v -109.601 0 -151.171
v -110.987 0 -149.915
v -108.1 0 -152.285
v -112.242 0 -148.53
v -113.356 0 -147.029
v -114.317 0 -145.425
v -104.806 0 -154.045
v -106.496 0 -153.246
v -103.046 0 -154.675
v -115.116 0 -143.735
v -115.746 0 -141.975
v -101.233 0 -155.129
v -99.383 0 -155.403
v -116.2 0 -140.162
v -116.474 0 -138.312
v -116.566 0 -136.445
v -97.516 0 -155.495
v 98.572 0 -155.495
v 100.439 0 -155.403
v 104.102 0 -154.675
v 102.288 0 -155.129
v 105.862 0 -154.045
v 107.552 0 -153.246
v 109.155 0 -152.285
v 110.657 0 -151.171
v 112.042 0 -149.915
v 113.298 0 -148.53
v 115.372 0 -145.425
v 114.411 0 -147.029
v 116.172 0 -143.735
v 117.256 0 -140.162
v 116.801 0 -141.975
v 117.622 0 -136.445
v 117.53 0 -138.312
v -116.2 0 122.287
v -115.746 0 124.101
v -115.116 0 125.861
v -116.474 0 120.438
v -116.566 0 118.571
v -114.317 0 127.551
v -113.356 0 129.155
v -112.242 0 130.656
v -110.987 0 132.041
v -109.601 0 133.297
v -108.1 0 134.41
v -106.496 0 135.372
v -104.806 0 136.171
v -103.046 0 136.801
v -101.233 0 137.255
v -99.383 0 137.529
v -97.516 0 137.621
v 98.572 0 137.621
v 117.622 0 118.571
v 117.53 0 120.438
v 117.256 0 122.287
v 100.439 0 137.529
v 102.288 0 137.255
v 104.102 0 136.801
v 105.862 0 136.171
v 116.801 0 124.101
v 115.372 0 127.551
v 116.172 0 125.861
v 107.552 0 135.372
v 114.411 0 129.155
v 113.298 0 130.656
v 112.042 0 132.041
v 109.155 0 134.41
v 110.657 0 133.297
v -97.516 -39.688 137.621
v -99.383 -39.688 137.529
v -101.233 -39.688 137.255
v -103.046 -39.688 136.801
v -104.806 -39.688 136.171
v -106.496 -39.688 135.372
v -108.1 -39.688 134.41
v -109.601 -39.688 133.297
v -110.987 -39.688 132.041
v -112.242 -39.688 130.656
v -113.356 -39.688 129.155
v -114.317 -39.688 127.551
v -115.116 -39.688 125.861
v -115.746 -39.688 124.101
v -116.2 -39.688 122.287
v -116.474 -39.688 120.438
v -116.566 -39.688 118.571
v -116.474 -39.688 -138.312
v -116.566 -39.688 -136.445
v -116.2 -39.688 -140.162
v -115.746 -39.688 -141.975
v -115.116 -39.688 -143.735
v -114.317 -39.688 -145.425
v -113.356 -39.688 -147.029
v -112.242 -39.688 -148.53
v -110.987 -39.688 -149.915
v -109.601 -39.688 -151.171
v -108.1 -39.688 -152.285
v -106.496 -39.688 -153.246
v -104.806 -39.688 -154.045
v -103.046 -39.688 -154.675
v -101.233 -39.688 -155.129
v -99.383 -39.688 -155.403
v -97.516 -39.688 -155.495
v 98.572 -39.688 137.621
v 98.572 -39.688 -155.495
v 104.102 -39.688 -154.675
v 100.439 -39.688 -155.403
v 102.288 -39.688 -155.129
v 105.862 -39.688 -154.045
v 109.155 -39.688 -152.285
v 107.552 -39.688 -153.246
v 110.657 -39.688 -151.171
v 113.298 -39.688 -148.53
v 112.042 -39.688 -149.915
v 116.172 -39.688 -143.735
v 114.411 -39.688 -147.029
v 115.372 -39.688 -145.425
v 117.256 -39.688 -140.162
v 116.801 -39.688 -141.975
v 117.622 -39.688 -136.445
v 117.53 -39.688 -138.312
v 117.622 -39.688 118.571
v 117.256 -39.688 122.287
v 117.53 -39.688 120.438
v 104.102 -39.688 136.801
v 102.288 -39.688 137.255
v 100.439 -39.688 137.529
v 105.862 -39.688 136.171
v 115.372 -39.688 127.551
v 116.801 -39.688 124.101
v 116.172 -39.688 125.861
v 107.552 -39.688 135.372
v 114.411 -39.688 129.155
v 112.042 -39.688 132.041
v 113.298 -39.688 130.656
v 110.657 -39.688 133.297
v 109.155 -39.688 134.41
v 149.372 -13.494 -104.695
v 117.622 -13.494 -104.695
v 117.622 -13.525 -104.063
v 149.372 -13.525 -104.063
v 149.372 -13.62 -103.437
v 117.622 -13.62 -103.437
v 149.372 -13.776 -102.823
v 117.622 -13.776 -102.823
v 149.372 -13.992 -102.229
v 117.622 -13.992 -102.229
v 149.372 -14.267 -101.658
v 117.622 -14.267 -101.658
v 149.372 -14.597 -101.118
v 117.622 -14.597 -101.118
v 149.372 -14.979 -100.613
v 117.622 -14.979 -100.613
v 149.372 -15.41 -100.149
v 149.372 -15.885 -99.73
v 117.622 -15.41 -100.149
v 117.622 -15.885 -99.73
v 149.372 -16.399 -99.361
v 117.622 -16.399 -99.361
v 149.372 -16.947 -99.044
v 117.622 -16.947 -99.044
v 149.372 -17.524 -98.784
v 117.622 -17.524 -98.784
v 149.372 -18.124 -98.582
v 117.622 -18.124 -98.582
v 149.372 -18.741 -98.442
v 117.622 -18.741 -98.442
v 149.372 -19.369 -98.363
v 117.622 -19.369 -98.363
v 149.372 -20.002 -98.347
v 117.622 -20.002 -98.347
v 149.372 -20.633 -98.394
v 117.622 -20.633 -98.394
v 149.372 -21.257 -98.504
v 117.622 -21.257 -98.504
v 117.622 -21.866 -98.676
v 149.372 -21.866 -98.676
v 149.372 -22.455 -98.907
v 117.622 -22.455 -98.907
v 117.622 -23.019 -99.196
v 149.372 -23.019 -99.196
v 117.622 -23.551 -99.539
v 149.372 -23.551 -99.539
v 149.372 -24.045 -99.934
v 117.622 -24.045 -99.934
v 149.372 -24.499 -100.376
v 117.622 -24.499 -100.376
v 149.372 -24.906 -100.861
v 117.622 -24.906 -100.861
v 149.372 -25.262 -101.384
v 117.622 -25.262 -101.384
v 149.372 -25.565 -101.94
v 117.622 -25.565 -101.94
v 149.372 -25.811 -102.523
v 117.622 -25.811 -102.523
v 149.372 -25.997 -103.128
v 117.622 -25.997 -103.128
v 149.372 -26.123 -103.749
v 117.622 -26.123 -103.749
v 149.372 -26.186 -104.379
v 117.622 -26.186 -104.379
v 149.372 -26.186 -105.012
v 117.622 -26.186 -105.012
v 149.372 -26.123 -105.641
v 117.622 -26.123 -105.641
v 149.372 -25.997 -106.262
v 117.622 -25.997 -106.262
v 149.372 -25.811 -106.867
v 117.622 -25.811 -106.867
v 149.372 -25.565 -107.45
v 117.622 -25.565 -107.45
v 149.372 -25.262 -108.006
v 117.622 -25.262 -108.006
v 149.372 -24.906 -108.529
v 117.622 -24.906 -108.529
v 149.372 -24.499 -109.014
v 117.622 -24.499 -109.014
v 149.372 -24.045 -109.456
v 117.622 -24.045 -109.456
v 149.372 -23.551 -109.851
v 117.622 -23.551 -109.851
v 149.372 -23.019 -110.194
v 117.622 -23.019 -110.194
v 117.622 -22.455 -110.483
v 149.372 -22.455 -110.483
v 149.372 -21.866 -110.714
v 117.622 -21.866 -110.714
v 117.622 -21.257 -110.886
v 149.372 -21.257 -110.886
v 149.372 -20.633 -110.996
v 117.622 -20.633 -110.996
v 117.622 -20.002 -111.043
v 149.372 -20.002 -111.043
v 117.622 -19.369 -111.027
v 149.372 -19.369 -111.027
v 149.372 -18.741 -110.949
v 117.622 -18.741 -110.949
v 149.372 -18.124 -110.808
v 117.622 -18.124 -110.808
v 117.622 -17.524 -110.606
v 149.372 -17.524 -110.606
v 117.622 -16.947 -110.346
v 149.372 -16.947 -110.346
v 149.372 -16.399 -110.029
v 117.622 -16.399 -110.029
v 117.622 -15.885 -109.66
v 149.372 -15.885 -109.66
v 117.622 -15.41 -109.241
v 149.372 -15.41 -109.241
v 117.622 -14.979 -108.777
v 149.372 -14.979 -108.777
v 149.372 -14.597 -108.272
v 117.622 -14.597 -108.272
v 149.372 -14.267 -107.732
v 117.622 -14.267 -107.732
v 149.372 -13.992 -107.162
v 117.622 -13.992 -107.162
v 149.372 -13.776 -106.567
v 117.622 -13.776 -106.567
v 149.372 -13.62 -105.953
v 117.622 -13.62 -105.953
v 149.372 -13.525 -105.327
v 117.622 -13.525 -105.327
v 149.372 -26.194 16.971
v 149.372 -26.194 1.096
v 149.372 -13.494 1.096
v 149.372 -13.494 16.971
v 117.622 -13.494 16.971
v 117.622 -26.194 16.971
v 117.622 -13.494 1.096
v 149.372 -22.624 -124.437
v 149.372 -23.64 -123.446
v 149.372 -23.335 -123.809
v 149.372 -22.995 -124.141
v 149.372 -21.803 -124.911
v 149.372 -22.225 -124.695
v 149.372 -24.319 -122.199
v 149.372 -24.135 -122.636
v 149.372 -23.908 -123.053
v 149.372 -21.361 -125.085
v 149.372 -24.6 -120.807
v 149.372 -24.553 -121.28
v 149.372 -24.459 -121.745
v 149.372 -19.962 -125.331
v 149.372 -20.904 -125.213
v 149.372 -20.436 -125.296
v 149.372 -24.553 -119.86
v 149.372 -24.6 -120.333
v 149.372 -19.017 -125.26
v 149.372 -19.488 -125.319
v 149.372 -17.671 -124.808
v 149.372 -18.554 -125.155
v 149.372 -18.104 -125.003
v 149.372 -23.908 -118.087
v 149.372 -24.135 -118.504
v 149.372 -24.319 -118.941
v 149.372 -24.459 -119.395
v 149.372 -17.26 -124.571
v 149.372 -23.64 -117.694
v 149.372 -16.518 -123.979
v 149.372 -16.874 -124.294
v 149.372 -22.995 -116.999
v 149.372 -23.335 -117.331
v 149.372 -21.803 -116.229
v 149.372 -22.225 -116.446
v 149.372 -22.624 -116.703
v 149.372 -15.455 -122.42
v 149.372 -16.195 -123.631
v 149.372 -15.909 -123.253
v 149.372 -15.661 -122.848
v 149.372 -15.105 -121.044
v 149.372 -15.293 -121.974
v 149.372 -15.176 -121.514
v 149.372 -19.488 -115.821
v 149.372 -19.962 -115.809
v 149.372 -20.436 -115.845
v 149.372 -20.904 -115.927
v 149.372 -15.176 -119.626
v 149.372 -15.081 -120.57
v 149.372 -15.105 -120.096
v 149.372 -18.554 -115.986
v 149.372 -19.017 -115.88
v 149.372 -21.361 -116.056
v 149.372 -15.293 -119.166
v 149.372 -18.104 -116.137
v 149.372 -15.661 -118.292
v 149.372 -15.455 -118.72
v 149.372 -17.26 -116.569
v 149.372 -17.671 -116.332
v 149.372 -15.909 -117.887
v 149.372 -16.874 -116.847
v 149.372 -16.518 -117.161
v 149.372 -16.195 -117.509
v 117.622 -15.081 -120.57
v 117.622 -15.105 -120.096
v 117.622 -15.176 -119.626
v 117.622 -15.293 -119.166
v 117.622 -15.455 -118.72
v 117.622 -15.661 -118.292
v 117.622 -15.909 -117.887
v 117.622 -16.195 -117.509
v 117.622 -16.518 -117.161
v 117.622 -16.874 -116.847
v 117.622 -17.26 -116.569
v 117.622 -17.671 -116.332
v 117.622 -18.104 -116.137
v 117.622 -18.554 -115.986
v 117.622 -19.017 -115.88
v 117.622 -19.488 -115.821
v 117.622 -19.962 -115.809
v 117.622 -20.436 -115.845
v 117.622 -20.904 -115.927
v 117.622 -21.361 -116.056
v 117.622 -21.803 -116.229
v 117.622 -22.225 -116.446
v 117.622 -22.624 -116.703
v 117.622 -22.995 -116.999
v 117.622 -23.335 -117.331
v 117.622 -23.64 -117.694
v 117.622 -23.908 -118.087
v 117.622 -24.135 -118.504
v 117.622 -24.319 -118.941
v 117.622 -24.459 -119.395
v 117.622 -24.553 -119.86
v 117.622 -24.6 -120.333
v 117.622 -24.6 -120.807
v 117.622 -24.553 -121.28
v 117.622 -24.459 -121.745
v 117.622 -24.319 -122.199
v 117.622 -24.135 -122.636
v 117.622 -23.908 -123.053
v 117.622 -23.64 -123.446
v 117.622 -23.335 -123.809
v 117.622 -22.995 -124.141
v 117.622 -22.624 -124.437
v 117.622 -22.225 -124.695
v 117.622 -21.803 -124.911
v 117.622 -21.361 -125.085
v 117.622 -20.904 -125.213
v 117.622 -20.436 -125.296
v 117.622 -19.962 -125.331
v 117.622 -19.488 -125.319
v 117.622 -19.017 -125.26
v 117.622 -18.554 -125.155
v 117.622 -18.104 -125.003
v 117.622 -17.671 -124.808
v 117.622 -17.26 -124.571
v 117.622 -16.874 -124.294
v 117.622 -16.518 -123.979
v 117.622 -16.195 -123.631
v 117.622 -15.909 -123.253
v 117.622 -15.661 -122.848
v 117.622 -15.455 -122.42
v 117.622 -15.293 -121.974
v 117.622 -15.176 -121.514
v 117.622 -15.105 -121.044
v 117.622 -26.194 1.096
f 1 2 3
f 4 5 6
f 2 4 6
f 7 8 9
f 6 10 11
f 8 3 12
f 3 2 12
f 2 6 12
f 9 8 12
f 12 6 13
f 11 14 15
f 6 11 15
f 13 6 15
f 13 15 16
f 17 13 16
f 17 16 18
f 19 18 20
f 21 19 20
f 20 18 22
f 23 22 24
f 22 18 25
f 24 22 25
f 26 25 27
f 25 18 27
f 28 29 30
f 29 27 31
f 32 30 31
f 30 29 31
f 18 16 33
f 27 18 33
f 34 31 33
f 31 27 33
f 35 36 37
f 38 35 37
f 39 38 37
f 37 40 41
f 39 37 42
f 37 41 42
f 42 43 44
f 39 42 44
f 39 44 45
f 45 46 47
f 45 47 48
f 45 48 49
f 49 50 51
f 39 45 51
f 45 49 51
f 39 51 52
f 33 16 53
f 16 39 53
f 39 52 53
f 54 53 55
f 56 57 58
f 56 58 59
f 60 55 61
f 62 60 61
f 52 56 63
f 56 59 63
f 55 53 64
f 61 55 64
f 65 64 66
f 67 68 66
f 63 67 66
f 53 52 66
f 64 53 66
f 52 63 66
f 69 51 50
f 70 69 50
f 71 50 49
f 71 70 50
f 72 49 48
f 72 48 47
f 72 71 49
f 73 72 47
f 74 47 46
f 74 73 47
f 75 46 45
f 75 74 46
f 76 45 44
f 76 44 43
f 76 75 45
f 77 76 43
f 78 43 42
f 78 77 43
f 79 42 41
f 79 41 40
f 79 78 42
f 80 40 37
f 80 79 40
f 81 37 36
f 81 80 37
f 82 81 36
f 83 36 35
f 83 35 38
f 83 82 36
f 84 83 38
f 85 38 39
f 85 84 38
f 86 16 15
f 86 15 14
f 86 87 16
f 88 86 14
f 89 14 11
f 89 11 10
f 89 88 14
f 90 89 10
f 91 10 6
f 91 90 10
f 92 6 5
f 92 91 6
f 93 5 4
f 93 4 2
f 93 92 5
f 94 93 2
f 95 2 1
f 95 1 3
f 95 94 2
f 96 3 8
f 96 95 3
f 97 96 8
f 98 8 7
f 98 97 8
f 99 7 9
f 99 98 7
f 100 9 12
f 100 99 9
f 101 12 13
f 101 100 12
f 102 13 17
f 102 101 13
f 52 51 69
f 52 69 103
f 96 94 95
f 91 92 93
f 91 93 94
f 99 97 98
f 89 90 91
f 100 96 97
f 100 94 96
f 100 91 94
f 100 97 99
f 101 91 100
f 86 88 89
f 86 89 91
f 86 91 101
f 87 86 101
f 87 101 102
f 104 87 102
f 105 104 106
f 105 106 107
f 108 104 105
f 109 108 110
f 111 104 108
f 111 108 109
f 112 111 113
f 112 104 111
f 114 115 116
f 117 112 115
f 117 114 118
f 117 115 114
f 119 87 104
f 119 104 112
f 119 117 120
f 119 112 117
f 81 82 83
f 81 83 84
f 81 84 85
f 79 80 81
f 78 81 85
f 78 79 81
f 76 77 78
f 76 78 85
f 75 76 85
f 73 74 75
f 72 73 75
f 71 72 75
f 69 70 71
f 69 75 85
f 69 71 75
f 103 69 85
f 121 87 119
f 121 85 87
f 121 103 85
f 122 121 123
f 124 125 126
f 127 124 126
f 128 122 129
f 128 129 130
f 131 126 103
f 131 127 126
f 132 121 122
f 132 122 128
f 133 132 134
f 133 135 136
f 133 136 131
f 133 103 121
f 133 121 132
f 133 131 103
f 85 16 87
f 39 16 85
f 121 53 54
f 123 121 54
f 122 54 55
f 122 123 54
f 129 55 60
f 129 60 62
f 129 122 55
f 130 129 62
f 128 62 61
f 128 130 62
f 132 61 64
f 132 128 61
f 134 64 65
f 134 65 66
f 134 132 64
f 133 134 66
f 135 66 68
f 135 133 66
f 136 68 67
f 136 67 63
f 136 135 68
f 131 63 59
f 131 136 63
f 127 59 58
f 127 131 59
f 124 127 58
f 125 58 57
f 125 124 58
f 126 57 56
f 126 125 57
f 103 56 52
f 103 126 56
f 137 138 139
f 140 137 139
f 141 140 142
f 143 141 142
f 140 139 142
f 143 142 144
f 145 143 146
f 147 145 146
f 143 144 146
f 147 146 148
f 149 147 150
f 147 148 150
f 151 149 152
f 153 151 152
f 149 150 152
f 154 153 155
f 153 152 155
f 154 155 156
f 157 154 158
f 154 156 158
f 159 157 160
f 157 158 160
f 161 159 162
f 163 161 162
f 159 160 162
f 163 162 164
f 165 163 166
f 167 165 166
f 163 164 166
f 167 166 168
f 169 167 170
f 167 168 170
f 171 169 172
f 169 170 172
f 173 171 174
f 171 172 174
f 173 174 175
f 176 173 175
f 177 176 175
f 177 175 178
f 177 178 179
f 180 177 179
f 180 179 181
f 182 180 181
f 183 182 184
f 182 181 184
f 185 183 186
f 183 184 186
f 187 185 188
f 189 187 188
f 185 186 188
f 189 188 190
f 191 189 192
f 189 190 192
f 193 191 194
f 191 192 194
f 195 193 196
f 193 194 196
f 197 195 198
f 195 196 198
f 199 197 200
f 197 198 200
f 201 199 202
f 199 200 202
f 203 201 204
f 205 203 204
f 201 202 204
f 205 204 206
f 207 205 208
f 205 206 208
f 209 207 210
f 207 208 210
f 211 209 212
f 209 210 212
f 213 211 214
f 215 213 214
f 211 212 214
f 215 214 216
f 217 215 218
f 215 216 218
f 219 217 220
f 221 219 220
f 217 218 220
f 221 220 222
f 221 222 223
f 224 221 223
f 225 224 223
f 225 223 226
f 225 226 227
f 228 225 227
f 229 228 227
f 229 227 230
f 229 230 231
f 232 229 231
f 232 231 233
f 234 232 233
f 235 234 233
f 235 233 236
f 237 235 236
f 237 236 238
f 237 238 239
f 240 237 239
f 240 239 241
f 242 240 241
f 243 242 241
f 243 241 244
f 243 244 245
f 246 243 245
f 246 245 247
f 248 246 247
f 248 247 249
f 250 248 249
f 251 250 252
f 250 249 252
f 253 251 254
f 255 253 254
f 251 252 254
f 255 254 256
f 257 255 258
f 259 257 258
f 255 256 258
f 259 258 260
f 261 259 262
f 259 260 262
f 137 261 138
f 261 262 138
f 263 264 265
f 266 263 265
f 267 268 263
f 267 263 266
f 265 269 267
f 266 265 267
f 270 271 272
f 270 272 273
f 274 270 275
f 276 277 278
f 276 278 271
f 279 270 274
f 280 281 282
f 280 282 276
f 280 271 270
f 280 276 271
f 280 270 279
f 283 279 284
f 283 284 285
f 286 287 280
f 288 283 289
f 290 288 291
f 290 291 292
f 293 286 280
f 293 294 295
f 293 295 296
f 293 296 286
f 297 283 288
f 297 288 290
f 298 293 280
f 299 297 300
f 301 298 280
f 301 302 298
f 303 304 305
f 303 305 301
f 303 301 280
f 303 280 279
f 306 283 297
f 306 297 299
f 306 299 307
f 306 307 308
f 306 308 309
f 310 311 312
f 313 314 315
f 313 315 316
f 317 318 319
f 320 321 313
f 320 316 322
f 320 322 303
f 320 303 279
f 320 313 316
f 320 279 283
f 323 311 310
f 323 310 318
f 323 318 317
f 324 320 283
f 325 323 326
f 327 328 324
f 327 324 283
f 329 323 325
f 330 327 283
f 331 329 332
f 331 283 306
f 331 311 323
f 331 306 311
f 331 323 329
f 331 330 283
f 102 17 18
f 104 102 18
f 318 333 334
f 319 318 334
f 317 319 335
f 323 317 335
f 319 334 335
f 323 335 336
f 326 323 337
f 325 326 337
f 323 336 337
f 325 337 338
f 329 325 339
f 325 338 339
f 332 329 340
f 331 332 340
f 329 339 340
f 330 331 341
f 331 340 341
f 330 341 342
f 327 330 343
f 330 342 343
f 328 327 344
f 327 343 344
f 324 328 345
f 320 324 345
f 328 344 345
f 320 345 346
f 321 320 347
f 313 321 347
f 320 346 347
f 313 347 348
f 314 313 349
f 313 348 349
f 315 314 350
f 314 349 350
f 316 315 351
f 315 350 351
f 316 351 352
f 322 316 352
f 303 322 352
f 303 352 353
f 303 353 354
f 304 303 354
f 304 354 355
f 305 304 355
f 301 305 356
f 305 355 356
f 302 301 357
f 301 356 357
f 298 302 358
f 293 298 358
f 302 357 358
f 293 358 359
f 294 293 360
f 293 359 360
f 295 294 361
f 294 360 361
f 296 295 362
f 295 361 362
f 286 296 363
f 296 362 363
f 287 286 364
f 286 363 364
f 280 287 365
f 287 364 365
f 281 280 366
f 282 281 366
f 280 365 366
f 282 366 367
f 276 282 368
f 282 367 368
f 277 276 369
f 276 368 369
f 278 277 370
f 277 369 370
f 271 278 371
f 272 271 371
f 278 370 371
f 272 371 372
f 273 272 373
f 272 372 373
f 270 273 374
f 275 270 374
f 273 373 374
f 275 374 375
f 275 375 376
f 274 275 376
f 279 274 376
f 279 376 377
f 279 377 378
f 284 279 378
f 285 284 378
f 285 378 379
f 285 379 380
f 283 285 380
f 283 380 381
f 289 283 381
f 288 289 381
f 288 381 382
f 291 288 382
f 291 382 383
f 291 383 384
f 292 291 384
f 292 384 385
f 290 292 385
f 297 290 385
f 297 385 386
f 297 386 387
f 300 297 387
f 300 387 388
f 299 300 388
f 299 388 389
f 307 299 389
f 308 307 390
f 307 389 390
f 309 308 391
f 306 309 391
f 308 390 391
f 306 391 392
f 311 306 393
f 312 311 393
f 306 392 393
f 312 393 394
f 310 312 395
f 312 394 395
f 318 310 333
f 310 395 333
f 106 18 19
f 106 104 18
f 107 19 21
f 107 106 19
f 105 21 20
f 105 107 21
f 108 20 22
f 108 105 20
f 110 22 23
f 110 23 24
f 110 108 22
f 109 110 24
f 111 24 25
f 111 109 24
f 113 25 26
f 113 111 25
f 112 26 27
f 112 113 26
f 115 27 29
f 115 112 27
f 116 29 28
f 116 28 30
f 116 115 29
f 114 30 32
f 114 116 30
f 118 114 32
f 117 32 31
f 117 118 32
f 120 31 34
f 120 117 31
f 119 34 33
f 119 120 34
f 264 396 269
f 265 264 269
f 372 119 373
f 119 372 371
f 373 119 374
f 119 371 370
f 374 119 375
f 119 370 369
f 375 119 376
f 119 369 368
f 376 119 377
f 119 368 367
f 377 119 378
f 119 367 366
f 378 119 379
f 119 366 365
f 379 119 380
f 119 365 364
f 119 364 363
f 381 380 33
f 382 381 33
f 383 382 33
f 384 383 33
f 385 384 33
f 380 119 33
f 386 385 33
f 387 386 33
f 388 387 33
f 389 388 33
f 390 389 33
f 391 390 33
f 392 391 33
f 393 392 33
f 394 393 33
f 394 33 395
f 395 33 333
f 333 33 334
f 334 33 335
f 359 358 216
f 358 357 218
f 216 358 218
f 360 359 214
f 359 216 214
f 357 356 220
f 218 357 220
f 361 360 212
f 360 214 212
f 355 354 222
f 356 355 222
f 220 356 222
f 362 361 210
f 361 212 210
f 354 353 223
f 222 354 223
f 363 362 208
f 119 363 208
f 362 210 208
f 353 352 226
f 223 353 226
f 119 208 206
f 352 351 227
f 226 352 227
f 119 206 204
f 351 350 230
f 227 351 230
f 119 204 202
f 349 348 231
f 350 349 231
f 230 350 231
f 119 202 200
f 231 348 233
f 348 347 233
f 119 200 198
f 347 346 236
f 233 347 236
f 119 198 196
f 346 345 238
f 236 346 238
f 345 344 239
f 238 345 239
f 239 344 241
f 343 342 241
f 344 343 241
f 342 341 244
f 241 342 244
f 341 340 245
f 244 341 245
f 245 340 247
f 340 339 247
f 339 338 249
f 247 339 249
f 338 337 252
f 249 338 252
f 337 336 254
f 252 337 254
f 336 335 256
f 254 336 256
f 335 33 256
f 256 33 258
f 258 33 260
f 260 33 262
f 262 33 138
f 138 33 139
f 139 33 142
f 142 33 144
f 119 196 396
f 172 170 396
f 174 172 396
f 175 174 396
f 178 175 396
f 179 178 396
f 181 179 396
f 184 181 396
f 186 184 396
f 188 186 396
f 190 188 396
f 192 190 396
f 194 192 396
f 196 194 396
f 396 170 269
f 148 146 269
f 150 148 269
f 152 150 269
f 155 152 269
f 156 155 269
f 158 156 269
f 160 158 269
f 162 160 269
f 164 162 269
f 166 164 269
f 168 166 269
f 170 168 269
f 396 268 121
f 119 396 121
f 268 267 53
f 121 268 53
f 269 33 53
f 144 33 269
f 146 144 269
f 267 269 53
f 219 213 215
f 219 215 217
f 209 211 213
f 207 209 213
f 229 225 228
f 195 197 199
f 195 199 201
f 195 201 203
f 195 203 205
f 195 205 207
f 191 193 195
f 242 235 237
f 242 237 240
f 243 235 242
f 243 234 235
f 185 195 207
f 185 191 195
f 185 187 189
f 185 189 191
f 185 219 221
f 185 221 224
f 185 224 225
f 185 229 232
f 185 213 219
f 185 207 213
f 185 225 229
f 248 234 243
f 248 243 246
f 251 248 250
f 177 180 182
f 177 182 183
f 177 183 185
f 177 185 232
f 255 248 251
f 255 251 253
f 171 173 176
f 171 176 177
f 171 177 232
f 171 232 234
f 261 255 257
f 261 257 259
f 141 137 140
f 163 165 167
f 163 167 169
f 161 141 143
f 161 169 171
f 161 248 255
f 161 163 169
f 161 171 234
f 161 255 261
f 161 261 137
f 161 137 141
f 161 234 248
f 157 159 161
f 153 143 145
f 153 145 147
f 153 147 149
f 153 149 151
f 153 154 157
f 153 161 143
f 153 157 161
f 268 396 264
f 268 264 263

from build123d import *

# Parameters (mm, degrees)
F0_W      = 234.188
F0_H      = 293.116
F1_DEPTH  = 39.6875
F2_R      = 19.05
F3_R      = 19.05
F4_R      = 19.05
F5_R      = 19.05
F6_R      = 6.35
F7_DEPTH  = 31.75
F8_R      = 4.7625
F9_DEPTH  = 31.75
F10_W     = 12.7
F10_H     = 15.875
F11_DEPTH = 31.75


with BuildPart() as f1:
    # F0 (on Front) → F1 (new body)
    with BuildSketch(Plane.XZ):
        with Locations((0.527771, -8.937072)):
            Rectangle(F0_W, F0_H)
    extrude(amount=F1_DEPTH)

    # F2
    f2_edges = [f1.edges().sort_by_distance(p)[0] for p in [
        (117.621771, -19.84375, 137.620928),
    ]]
    fillet(f2_edges, radius=F2_R)

    # F3
    f3_edges = [f1.edges().sort_by_distance(p)[0] for p in [
        (-116.566229, -19.84375, 137.620928),
    ]]
    fillet(f3_edges, radius=F3_R)

    # F4
    f4_edges = [f1.edges().sort_by_distance(p)[0] for p in [
        (-116.566229, -19.84375, -155.495072),
    ]]
    fillet(f4_edges, radius=F4_R)

    # F5
    f5_edges = [f1.edges().sort_by_distance(p)[0] for p in [
        (117.621771, -19.84375, -155.495072),
    ]]
    fillet(f5_edges, radius=F5_R)

    # F6 (on face) → F7 (join)
    with BuildSketch(Plane.YZ.offset(117.621771)):
        with Locations((-19.84375, -104.695072)):
            Circle(F6_R)
    extrude(amount=F7_DEPTH)

    # F8 (on face) → F9 (join)
    with BuildSketch(Plane.YZ.offset(117.621771)):
        with Locations((-19.84375, -120.570072)):
            Circle(F8_R)
    extrude(amount=F9_DEPTH)

    # F10 (on face) → F11 (join)
    with BuildSketch(Plane.YZ.offset(117.621771)):
        with Locations((-19.84375, 9.033428)):
            Rectangle(F10_W, F10_H)
    extrude(amount=F11_DEPTH)


solid = f1.part
